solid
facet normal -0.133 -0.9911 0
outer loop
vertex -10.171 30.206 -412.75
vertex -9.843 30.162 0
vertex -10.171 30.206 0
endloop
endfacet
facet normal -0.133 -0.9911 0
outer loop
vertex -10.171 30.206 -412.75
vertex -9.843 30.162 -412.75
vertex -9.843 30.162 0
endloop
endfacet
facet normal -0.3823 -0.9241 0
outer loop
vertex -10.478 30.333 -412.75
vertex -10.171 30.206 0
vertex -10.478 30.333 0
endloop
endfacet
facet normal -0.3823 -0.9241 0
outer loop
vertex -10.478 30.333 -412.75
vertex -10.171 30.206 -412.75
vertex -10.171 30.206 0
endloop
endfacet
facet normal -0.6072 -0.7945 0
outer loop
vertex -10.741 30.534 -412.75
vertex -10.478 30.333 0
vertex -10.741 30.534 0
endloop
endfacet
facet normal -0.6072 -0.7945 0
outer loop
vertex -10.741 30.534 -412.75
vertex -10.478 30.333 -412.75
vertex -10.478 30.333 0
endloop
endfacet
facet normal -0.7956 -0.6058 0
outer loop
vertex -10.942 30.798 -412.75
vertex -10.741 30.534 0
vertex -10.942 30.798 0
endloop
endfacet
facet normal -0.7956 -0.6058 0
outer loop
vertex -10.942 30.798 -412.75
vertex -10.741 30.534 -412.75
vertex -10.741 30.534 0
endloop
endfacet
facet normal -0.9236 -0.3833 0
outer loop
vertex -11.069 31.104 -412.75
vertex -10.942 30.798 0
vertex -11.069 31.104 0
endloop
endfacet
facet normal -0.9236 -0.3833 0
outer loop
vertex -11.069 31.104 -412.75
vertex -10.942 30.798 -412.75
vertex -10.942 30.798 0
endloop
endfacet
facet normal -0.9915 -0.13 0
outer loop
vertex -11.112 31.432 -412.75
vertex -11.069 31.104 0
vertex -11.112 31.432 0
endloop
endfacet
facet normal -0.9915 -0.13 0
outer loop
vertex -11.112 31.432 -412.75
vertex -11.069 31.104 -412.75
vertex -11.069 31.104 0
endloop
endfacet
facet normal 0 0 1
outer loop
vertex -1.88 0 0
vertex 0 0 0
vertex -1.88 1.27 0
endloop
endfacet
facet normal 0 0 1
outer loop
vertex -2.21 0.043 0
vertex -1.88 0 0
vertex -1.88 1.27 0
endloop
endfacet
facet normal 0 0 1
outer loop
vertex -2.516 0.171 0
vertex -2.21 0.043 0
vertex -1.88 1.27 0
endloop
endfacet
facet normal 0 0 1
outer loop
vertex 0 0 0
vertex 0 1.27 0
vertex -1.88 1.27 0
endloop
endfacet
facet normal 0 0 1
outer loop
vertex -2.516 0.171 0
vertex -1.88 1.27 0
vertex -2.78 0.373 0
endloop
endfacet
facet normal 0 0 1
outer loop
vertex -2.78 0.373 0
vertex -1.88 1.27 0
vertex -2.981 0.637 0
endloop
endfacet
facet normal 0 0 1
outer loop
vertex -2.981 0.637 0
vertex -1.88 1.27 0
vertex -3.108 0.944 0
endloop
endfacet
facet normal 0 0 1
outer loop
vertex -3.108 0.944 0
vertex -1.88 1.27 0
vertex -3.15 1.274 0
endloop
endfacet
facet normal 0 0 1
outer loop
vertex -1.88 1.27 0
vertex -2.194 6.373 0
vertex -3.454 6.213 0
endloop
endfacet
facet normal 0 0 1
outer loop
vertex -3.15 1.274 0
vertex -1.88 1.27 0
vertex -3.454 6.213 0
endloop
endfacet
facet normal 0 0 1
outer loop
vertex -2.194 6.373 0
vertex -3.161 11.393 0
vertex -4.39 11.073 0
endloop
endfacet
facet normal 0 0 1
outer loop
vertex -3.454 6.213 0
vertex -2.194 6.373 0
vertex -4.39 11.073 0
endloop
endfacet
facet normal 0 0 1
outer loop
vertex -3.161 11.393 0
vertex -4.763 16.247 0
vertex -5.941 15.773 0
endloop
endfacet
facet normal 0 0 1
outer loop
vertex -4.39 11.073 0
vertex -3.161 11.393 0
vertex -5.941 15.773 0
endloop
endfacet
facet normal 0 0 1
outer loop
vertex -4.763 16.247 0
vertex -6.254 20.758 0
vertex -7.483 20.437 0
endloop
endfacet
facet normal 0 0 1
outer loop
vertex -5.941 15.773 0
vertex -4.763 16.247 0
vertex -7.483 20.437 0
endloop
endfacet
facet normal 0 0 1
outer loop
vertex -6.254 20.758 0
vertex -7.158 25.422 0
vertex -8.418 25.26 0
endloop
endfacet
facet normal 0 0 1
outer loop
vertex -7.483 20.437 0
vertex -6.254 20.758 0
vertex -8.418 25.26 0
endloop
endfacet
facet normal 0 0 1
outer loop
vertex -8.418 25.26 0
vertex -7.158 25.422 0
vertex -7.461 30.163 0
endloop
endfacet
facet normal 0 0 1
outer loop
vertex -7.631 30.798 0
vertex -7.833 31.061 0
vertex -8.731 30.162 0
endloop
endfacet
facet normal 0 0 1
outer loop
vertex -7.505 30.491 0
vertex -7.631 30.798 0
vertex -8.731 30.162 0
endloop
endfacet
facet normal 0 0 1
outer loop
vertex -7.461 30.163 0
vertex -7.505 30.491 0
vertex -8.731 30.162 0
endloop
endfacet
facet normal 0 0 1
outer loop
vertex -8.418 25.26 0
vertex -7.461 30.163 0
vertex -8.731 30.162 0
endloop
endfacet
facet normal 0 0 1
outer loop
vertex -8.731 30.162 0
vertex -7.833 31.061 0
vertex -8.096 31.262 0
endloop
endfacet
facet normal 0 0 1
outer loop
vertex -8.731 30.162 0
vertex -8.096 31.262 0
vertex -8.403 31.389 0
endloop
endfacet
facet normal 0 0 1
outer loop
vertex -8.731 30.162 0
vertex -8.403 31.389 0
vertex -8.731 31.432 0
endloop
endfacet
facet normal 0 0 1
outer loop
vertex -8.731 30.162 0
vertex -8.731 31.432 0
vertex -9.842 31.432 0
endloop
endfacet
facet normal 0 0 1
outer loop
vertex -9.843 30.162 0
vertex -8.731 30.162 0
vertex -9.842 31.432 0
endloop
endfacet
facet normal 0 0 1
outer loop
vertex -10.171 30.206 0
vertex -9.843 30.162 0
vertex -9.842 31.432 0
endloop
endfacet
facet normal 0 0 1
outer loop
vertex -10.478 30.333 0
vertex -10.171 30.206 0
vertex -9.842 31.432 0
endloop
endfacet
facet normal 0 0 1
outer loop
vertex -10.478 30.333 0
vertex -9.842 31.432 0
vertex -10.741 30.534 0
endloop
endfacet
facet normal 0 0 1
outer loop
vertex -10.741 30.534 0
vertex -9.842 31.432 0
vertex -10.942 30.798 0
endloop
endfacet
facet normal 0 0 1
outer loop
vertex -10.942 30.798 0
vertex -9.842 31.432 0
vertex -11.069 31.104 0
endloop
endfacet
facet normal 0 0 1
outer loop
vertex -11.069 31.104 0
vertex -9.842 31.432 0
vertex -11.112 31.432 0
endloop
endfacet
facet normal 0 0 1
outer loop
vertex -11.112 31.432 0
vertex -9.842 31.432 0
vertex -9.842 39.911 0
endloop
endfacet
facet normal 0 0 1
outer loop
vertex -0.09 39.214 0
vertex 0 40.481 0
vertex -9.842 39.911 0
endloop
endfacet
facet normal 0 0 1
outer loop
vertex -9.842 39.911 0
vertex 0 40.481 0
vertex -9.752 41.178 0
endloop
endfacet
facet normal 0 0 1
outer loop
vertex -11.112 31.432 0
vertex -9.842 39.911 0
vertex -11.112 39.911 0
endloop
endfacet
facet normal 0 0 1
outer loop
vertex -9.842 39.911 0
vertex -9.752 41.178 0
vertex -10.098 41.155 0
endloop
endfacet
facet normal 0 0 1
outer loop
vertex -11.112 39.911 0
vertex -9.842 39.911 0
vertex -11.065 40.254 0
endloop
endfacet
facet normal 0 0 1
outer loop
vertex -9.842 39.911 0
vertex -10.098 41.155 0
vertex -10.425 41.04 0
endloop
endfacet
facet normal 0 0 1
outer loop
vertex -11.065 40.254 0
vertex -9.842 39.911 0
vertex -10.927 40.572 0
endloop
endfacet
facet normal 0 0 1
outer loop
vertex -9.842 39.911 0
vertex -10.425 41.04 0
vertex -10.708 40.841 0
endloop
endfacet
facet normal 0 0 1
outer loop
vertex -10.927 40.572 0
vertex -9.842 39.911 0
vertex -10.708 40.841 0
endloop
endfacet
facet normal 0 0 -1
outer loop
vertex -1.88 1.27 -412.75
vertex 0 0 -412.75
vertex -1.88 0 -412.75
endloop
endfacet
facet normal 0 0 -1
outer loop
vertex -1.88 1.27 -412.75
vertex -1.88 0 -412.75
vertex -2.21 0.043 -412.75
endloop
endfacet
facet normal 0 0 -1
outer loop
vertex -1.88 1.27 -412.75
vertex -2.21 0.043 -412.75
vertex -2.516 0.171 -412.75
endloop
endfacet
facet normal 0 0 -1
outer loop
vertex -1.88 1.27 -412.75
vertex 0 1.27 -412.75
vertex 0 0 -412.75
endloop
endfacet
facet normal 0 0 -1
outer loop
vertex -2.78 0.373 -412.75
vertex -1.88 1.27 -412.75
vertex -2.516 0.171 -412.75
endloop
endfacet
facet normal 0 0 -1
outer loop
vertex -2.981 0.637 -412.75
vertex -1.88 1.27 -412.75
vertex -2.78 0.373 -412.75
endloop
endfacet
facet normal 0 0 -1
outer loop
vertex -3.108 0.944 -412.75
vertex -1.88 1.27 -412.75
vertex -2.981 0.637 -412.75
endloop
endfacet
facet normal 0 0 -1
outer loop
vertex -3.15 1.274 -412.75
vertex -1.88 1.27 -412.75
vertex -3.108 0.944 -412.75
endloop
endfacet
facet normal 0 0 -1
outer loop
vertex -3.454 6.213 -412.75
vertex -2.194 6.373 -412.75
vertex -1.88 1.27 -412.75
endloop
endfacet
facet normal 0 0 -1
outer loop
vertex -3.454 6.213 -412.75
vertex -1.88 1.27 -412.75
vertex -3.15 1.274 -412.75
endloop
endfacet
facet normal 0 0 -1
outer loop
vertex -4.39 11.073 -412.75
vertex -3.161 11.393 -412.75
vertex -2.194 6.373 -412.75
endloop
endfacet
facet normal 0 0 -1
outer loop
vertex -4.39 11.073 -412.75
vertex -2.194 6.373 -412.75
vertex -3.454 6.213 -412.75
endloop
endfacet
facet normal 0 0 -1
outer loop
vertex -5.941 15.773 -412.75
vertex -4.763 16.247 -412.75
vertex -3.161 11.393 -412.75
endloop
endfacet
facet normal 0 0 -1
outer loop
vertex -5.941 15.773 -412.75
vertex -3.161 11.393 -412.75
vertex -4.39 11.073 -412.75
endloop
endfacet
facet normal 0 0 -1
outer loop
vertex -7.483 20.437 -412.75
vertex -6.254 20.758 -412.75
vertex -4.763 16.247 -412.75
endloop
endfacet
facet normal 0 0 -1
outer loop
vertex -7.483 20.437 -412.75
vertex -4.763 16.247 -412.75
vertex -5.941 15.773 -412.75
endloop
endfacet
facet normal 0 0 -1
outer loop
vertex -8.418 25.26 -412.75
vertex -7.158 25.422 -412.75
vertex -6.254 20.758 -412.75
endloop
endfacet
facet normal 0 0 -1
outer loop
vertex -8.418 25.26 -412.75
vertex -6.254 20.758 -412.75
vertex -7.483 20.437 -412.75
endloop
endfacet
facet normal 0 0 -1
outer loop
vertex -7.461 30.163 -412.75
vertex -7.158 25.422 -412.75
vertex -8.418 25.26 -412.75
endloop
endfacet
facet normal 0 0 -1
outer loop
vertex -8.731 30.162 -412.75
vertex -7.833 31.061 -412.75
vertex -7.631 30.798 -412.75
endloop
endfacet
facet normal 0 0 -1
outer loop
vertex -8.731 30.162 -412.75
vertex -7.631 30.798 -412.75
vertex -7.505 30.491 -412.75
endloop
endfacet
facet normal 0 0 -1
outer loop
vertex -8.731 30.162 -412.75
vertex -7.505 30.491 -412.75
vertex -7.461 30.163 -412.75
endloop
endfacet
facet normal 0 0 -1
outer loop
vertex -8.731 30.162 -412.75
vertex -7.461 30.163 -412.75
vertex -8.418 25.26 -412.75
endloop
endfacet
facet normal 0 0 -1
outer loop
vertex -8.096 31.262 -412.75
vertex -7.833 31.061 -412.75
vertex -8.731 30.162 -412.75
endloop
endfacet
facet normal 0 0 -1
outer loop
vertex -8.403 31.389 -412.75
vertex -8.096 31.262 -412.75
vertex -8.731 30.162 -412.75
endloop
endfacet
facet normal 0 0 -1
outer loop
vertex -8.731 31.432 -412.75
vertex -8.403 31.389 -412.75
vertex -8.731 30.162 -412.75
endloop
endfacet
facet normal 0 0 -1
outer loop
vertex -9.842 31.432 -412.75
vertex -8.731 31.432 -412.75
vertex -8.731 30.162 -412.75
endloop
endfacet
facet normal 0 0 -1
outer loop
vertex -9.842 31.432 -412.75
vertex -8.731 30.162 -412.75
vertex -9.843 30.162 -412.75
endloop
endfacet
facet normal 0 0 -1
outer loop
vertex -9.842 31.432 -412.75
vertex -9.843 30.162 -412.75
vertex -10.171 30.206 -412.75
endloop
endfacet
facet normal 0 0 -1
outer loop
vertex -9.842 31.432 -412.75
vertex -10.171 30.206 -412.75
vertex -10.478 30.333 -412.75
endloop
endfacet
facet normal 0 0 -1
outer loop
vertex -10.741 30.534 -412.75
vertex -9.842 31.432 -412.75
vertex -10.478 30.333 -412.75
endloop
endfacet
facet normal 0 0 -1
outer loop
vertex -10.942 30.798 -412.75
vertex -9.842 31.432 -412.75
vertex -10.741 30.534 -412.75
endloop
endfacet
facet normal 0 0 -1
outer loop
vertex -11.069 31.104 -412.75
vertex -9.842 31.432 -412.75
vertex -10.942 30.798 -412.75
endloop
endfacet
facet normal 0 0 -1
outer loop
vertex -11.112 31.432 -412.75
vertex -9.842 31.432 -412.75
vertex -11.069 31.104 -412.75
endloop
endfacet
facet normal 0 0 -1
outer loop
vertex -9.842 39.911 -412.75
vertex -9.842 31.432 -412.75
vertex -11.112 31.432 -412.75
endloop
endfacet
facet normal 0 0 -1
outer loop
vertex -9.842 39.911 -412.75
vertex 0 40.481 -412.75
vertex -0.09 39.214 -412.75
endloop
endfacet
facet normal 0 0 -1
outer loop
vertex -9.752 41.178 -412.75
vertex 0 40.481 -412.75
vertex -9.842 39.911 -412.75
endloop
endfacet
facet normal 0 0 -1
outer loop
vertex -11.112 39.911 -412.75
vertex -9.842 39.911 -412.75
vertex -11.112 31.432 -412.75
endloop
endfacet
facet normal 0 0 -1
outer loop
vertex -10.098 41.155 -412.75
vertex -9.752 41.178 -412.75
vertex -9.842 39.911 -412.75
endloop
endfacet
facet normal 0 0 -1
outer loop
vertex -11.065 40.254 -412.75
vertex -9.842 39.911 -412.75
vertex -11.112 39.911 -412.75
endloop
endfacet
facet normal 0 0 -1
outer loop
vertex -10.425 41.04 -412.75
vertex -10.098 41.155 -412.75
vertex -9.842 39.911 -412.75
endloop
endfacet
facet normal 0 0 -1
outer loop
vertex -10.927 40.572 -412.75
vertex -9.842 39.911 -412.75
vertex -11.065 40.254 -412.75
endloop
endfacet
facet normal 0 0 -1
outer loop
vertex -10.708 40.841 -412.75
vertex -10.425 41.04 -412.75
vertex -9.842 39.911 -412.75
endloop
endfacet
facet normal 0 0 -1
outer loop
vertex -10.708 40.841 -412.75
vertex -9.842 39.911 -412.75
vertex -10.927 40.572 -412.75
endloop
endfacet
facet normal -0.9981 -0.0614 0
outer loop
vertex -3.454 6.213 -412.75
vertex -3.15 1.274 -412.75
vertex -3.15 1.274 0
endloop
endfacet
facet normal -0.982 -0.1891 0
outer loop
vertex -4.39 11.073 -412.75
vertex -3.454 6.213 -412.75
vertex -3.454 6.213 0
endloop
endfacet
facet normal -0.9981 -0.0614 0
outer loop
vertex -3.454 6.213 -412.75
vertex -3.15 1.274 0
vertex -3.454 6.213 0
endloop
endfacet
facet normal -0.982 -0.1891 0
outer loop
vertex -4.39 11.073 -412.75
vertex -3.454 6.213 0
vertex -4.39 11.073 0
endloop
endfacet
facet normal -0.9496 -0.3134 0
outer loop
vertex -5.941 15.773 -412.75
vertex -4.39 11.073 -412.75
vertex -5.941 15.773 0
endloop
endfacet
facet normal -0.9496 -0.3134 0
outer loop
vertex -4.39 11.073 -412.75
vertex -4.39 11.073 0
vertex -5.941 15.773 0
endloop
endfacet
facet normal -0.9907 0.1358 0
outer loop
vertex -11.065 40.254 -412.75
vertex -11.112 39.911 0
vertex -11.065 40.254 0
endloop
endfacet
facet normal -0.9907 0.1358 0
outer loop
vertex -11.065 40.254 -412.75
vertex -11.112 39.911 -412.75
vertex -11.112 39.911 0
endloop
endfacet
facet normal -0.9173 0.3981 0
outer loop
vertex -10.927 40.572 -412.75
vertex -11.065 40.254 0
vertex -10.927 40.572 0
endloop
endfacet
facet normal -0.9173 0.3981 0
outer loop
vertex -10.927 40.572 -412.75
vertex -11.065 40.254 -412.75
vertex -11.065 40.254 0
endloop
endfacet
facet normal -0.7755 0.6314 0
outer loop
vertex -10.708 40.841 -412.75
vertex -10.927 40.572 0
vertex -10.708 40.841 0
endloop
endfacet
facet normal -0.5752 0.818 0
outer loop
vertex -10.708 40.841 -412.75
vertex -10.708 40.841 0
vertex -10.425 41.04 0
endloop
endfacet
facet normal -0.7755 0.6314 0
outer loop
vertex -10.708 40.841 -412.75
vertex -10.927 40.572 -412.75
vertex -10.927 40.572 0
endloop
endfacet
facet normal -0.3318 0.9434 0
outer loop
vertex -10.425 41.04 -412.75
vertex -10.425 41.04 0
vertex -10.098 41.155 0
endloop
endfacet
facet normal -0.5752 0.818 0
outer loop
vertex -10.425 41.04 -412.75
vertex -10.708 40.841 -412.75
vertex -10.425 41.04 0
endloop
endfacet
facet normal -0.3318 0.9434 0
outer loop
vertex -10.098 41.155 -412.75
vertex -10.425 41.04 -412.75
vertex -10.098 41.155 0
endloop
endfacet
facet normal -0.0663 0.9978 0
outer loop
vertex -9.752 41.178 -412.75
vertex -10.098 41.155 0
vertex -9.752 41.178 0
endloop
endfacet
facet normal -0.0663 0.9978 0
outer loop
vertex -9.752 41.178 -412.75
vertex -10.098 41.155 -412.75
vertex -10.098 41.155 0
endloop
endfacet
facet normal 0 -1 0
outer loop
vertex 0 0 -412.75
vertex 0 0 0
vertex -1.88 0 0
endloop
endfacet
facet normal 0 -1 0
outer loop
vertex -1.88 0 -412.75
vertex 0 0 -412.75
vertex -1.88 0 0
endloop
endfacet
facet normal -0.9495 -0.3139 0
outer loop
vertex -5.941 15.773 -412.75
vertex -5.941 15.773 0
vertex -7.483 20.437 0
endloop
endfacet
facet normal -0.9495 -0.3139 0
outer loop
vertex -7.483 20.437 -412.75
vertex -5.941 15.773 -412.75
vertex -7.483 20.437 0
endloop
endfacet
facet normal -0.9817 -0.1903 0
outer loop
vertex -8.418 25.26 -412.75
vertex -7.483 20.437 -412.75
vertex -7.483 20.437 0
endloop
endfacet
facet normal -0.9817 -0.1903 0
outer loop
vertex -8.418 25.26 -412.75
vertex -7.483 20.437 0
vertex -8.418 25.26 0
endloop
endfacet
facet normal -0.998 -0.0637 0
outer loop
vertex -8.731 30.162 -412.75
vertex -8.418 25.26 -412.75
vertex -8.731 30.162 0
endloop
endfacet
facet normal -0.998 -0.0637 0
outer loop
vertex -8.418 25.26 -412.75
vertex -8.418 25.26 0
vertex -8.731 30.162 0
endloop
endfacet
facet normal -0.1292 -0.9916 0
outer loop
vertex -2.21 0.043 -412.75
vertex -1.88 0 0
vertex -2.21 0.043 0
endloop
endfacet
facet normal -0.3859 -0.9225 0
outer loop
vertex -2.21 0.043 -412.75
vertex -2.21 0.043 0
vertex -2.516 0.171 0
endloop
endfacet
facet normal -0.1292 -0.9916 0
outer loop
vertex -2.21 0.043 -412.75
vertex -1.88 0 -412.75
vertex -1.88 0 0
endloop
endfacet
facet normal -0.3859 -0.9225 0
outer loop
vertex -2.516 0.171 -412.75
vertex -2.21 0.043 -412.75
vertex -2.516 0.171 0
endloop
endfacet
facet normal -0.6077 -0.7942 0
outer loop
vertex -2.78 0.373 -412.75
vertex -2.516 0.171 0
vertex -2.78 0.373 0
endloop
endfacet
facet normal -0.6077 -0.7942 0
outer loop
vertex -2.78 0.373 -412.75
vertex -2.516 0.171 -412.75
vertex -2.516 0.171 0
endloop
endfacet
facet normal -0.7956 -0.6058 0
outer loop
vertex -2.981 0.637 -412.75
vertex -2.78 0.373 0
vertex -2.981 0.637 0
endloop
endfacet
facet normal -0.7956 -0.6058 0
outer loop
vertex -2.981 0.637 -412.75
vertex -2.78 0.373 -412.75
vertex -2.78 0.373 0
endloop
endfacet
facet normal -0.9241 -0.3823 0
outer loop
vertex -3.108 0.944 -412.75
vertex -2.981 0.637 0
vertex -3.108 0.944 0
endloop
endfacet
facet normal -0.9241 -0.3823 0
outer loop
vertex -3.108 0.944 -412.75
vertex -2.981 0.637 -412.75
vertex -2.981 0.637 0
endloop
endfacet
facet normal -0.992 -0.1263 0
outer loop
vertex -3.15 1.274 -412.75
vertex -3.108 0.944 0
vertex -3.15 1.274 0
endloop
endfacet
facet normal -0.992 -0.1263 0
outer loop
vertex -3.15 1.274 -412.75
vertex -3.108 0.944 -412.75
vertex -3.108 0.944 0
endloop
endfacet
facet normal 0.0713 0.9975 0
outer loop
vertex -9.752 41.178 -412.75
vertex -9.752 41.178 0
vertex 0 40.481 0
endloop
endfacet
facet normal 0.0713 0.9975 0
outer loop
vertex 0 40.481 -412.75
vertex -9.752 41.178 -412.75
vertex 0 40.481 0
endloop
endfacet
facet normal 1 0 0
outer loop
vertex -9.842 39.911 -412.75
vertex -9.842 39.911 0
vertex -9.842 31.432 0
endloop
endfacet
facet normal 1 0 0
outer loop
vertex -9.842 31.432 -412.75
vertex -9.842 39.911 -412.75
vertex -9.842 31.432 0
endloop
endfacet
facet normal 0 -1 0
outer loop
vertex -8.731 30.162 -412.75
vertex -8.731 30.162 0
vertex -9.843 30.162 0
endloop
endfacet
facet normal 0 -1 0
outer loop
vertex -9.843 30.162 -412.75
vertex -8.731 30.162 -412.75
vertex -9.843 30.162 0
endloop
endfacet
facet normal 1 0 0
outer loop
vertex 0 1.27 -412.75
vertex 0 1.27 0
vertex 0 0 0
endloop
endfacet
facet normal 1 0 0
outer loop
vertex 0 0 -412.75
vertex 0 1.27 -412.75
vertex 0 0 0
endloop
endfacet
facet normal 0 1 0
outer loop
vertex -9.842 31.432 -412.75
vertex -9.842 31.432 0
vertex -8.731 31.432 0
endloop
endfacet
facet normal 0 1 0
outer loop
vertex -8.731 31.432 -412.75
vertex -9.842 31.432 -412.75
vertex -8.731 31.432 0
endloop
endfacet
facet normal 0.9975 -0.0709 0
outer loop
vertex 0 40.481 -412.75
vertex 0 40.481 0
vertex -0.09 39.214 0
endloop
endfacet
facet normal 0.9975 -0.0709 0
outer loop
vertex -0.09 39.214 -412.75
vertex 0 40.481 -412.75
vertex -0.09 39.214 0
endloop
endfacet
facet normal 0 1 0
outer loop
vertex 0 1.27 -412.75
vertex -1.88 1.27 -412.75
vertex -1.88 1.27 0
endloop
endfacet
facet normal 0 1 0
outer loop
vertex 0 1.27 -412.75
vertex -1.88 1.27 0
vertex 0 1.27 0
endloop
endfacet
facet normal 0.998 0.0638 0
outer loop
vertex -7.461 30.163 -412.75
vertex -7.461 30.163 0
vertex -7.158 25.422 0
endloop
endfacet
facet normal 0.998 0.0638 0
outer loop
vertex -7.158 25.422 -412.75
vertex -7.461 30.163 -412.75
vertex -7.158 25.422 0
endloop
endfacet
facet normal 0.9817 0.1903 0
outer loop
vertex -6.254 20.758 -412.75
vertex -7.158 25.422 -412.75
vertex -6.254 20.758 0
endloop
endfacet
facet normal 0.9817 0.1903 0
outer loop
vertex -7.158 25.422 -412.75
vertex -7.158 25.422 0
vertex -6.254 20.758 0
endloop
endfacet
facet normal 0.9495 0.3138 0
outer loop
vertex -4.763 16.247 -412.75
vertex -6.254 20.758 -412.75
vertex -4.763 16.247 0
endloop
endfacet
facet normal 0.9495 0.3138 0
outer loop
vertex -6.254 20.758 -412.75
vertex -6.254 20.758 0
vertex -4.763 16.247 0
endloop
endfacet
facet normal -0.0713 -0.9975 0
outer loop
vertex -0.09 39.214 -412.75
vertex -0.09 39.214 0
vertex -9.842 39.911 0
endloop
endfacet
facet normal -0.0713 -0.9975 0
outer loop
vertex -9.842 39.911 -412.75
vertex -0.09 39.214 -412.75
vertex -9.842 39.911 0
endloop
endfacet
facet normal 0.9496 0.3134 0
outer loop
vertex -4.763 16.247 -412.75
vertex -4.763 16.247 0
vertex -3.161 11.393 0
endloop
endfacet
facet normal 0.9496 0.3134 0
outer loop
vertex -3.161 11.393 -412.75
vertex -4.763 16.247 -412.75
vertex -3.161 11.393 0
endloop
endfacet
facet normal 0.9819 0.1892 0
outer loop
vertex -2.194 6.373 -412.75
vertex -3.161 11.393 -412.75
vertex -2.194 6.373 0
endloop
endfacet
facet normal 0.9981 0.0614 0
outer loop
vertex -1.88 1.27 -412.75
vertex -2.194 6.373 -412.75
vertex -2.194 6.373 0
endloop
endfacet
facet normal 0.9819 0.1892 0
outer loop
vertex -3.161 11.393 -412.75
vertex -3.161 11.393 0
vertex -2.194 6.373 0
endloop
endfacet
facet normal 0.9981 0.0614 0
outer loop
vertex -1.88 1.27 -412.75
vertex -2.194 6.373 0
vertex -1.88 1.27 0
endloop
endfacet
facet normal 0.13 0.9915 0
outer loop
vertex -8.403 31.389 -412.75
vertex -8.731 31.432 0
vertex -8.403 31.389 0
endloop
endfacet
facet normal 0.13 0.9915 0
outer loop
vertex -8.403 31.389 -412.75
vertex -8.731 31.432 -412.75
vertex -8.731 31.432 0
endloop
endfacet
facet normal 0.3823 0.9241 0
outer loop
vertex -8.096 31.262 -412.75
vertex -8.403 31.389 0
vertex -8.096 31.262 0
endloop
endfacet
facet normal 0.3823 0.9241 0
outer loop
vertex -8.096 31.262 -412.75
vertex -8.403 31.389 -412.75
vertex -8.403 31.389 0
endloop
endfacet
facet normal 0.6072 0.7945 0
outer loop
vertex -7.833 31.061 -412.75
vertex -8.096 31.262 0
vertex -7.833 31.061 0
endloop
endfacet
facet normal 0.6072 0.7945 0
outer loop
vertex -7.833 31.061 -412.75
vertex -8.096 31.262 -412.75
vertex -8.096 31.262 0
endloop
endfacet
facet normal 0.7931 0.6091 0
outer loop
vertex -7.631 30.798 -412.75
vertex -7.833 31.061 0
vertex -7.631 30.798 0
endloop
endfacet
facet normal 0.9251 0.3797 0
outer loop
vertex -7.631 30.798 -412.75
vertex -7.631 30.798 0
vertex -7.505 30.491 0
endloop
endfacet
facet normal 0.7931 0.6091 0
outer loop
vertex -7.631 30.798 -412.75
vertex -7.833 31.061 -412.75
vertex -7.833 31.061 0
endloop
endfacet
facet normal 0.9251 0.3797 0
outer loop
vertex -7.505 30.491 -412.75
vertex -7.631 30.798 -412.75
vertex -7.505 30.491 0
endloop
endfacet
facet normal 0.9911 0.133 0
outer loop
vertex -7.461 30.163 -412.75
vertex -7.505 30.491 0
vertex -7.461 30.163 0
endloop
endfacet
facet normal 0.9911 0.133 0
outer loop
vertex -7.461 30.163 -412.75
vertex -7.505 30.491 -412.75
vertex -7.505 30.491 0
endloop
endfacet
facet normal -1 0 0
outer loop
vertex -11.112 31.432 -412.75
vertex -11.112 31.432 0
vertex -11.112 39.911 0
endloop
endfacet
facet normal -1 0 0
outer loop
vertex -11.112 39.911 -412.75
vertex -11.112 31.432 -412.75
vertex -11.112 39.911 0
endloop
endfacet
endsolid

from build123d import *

# Parameters (mm, degrees)
EXTRUDE_THIN1_DEPTH = 412.75
FILLET1_R           = 1.27


with BuildPart() as part:
    # Sketch1 → Extrude-Thin1 (new body)
    with BuildSketch(Plane.XY):
        with BuildLine():
            Line((0, 0), (-3.175, 0))
            ThreePointArc((-3.175, 0), (-3.728678916, 8.031723409), (-5.94070318, 15.772659394))
            ThreePointArc((-5.94070318, 15.772659394), (-8.027174826, 22.833539224), (-8.73125, 30.1625))
            Line((-8.73125, 30.1625), (-11.1125, 30.1625))
            Line((-11.1125, 30.1625), (-11.1125, 41.275))
            Line((-11.1125, 41.275), (0, 40.48125))
            Line((0, 40.48125), (-0.090483753, 39.214477451))
            Line((-0.090483753, 39.214477451), (-9.8425, 39.91105004))
            Line((-9.8425, 39.91105004), (-9.8425, 31.4325))
            Line((-9.8425, 31.4325), (-7.43958058, 31.4325))
            ThreePointArc((-7.43958058, 31.4325), (-6.895991056, 23.69982792), (-4.762762457, 16.247375785))
            ThreePointArc((-4.762762457, 16.247375785), (-2.59675891, 8.898174327), (-1.880316394, 1.27))
            Line((-1.880316394, 1.27), (0, 1.27))
            Line((0, 1.27), (0, 0))
        make_face()
    extrude(amount=-EXTRUDE_THIN1_DEPTH)

    # Fillet1
    fillet1_edges = [part.edges().sort_by_distance(p)[0] for p in [
        (-7.43958058, 31.4325, -206.375),
        (-3.175, 0, -206.375),
        (-11.1125, 30.1625, -206.375),
        (-11.1125, 41.275, -206.375),
    ]]
    fillet(fillet1_edges, radius=FILLET1_R)


solid = part.part
